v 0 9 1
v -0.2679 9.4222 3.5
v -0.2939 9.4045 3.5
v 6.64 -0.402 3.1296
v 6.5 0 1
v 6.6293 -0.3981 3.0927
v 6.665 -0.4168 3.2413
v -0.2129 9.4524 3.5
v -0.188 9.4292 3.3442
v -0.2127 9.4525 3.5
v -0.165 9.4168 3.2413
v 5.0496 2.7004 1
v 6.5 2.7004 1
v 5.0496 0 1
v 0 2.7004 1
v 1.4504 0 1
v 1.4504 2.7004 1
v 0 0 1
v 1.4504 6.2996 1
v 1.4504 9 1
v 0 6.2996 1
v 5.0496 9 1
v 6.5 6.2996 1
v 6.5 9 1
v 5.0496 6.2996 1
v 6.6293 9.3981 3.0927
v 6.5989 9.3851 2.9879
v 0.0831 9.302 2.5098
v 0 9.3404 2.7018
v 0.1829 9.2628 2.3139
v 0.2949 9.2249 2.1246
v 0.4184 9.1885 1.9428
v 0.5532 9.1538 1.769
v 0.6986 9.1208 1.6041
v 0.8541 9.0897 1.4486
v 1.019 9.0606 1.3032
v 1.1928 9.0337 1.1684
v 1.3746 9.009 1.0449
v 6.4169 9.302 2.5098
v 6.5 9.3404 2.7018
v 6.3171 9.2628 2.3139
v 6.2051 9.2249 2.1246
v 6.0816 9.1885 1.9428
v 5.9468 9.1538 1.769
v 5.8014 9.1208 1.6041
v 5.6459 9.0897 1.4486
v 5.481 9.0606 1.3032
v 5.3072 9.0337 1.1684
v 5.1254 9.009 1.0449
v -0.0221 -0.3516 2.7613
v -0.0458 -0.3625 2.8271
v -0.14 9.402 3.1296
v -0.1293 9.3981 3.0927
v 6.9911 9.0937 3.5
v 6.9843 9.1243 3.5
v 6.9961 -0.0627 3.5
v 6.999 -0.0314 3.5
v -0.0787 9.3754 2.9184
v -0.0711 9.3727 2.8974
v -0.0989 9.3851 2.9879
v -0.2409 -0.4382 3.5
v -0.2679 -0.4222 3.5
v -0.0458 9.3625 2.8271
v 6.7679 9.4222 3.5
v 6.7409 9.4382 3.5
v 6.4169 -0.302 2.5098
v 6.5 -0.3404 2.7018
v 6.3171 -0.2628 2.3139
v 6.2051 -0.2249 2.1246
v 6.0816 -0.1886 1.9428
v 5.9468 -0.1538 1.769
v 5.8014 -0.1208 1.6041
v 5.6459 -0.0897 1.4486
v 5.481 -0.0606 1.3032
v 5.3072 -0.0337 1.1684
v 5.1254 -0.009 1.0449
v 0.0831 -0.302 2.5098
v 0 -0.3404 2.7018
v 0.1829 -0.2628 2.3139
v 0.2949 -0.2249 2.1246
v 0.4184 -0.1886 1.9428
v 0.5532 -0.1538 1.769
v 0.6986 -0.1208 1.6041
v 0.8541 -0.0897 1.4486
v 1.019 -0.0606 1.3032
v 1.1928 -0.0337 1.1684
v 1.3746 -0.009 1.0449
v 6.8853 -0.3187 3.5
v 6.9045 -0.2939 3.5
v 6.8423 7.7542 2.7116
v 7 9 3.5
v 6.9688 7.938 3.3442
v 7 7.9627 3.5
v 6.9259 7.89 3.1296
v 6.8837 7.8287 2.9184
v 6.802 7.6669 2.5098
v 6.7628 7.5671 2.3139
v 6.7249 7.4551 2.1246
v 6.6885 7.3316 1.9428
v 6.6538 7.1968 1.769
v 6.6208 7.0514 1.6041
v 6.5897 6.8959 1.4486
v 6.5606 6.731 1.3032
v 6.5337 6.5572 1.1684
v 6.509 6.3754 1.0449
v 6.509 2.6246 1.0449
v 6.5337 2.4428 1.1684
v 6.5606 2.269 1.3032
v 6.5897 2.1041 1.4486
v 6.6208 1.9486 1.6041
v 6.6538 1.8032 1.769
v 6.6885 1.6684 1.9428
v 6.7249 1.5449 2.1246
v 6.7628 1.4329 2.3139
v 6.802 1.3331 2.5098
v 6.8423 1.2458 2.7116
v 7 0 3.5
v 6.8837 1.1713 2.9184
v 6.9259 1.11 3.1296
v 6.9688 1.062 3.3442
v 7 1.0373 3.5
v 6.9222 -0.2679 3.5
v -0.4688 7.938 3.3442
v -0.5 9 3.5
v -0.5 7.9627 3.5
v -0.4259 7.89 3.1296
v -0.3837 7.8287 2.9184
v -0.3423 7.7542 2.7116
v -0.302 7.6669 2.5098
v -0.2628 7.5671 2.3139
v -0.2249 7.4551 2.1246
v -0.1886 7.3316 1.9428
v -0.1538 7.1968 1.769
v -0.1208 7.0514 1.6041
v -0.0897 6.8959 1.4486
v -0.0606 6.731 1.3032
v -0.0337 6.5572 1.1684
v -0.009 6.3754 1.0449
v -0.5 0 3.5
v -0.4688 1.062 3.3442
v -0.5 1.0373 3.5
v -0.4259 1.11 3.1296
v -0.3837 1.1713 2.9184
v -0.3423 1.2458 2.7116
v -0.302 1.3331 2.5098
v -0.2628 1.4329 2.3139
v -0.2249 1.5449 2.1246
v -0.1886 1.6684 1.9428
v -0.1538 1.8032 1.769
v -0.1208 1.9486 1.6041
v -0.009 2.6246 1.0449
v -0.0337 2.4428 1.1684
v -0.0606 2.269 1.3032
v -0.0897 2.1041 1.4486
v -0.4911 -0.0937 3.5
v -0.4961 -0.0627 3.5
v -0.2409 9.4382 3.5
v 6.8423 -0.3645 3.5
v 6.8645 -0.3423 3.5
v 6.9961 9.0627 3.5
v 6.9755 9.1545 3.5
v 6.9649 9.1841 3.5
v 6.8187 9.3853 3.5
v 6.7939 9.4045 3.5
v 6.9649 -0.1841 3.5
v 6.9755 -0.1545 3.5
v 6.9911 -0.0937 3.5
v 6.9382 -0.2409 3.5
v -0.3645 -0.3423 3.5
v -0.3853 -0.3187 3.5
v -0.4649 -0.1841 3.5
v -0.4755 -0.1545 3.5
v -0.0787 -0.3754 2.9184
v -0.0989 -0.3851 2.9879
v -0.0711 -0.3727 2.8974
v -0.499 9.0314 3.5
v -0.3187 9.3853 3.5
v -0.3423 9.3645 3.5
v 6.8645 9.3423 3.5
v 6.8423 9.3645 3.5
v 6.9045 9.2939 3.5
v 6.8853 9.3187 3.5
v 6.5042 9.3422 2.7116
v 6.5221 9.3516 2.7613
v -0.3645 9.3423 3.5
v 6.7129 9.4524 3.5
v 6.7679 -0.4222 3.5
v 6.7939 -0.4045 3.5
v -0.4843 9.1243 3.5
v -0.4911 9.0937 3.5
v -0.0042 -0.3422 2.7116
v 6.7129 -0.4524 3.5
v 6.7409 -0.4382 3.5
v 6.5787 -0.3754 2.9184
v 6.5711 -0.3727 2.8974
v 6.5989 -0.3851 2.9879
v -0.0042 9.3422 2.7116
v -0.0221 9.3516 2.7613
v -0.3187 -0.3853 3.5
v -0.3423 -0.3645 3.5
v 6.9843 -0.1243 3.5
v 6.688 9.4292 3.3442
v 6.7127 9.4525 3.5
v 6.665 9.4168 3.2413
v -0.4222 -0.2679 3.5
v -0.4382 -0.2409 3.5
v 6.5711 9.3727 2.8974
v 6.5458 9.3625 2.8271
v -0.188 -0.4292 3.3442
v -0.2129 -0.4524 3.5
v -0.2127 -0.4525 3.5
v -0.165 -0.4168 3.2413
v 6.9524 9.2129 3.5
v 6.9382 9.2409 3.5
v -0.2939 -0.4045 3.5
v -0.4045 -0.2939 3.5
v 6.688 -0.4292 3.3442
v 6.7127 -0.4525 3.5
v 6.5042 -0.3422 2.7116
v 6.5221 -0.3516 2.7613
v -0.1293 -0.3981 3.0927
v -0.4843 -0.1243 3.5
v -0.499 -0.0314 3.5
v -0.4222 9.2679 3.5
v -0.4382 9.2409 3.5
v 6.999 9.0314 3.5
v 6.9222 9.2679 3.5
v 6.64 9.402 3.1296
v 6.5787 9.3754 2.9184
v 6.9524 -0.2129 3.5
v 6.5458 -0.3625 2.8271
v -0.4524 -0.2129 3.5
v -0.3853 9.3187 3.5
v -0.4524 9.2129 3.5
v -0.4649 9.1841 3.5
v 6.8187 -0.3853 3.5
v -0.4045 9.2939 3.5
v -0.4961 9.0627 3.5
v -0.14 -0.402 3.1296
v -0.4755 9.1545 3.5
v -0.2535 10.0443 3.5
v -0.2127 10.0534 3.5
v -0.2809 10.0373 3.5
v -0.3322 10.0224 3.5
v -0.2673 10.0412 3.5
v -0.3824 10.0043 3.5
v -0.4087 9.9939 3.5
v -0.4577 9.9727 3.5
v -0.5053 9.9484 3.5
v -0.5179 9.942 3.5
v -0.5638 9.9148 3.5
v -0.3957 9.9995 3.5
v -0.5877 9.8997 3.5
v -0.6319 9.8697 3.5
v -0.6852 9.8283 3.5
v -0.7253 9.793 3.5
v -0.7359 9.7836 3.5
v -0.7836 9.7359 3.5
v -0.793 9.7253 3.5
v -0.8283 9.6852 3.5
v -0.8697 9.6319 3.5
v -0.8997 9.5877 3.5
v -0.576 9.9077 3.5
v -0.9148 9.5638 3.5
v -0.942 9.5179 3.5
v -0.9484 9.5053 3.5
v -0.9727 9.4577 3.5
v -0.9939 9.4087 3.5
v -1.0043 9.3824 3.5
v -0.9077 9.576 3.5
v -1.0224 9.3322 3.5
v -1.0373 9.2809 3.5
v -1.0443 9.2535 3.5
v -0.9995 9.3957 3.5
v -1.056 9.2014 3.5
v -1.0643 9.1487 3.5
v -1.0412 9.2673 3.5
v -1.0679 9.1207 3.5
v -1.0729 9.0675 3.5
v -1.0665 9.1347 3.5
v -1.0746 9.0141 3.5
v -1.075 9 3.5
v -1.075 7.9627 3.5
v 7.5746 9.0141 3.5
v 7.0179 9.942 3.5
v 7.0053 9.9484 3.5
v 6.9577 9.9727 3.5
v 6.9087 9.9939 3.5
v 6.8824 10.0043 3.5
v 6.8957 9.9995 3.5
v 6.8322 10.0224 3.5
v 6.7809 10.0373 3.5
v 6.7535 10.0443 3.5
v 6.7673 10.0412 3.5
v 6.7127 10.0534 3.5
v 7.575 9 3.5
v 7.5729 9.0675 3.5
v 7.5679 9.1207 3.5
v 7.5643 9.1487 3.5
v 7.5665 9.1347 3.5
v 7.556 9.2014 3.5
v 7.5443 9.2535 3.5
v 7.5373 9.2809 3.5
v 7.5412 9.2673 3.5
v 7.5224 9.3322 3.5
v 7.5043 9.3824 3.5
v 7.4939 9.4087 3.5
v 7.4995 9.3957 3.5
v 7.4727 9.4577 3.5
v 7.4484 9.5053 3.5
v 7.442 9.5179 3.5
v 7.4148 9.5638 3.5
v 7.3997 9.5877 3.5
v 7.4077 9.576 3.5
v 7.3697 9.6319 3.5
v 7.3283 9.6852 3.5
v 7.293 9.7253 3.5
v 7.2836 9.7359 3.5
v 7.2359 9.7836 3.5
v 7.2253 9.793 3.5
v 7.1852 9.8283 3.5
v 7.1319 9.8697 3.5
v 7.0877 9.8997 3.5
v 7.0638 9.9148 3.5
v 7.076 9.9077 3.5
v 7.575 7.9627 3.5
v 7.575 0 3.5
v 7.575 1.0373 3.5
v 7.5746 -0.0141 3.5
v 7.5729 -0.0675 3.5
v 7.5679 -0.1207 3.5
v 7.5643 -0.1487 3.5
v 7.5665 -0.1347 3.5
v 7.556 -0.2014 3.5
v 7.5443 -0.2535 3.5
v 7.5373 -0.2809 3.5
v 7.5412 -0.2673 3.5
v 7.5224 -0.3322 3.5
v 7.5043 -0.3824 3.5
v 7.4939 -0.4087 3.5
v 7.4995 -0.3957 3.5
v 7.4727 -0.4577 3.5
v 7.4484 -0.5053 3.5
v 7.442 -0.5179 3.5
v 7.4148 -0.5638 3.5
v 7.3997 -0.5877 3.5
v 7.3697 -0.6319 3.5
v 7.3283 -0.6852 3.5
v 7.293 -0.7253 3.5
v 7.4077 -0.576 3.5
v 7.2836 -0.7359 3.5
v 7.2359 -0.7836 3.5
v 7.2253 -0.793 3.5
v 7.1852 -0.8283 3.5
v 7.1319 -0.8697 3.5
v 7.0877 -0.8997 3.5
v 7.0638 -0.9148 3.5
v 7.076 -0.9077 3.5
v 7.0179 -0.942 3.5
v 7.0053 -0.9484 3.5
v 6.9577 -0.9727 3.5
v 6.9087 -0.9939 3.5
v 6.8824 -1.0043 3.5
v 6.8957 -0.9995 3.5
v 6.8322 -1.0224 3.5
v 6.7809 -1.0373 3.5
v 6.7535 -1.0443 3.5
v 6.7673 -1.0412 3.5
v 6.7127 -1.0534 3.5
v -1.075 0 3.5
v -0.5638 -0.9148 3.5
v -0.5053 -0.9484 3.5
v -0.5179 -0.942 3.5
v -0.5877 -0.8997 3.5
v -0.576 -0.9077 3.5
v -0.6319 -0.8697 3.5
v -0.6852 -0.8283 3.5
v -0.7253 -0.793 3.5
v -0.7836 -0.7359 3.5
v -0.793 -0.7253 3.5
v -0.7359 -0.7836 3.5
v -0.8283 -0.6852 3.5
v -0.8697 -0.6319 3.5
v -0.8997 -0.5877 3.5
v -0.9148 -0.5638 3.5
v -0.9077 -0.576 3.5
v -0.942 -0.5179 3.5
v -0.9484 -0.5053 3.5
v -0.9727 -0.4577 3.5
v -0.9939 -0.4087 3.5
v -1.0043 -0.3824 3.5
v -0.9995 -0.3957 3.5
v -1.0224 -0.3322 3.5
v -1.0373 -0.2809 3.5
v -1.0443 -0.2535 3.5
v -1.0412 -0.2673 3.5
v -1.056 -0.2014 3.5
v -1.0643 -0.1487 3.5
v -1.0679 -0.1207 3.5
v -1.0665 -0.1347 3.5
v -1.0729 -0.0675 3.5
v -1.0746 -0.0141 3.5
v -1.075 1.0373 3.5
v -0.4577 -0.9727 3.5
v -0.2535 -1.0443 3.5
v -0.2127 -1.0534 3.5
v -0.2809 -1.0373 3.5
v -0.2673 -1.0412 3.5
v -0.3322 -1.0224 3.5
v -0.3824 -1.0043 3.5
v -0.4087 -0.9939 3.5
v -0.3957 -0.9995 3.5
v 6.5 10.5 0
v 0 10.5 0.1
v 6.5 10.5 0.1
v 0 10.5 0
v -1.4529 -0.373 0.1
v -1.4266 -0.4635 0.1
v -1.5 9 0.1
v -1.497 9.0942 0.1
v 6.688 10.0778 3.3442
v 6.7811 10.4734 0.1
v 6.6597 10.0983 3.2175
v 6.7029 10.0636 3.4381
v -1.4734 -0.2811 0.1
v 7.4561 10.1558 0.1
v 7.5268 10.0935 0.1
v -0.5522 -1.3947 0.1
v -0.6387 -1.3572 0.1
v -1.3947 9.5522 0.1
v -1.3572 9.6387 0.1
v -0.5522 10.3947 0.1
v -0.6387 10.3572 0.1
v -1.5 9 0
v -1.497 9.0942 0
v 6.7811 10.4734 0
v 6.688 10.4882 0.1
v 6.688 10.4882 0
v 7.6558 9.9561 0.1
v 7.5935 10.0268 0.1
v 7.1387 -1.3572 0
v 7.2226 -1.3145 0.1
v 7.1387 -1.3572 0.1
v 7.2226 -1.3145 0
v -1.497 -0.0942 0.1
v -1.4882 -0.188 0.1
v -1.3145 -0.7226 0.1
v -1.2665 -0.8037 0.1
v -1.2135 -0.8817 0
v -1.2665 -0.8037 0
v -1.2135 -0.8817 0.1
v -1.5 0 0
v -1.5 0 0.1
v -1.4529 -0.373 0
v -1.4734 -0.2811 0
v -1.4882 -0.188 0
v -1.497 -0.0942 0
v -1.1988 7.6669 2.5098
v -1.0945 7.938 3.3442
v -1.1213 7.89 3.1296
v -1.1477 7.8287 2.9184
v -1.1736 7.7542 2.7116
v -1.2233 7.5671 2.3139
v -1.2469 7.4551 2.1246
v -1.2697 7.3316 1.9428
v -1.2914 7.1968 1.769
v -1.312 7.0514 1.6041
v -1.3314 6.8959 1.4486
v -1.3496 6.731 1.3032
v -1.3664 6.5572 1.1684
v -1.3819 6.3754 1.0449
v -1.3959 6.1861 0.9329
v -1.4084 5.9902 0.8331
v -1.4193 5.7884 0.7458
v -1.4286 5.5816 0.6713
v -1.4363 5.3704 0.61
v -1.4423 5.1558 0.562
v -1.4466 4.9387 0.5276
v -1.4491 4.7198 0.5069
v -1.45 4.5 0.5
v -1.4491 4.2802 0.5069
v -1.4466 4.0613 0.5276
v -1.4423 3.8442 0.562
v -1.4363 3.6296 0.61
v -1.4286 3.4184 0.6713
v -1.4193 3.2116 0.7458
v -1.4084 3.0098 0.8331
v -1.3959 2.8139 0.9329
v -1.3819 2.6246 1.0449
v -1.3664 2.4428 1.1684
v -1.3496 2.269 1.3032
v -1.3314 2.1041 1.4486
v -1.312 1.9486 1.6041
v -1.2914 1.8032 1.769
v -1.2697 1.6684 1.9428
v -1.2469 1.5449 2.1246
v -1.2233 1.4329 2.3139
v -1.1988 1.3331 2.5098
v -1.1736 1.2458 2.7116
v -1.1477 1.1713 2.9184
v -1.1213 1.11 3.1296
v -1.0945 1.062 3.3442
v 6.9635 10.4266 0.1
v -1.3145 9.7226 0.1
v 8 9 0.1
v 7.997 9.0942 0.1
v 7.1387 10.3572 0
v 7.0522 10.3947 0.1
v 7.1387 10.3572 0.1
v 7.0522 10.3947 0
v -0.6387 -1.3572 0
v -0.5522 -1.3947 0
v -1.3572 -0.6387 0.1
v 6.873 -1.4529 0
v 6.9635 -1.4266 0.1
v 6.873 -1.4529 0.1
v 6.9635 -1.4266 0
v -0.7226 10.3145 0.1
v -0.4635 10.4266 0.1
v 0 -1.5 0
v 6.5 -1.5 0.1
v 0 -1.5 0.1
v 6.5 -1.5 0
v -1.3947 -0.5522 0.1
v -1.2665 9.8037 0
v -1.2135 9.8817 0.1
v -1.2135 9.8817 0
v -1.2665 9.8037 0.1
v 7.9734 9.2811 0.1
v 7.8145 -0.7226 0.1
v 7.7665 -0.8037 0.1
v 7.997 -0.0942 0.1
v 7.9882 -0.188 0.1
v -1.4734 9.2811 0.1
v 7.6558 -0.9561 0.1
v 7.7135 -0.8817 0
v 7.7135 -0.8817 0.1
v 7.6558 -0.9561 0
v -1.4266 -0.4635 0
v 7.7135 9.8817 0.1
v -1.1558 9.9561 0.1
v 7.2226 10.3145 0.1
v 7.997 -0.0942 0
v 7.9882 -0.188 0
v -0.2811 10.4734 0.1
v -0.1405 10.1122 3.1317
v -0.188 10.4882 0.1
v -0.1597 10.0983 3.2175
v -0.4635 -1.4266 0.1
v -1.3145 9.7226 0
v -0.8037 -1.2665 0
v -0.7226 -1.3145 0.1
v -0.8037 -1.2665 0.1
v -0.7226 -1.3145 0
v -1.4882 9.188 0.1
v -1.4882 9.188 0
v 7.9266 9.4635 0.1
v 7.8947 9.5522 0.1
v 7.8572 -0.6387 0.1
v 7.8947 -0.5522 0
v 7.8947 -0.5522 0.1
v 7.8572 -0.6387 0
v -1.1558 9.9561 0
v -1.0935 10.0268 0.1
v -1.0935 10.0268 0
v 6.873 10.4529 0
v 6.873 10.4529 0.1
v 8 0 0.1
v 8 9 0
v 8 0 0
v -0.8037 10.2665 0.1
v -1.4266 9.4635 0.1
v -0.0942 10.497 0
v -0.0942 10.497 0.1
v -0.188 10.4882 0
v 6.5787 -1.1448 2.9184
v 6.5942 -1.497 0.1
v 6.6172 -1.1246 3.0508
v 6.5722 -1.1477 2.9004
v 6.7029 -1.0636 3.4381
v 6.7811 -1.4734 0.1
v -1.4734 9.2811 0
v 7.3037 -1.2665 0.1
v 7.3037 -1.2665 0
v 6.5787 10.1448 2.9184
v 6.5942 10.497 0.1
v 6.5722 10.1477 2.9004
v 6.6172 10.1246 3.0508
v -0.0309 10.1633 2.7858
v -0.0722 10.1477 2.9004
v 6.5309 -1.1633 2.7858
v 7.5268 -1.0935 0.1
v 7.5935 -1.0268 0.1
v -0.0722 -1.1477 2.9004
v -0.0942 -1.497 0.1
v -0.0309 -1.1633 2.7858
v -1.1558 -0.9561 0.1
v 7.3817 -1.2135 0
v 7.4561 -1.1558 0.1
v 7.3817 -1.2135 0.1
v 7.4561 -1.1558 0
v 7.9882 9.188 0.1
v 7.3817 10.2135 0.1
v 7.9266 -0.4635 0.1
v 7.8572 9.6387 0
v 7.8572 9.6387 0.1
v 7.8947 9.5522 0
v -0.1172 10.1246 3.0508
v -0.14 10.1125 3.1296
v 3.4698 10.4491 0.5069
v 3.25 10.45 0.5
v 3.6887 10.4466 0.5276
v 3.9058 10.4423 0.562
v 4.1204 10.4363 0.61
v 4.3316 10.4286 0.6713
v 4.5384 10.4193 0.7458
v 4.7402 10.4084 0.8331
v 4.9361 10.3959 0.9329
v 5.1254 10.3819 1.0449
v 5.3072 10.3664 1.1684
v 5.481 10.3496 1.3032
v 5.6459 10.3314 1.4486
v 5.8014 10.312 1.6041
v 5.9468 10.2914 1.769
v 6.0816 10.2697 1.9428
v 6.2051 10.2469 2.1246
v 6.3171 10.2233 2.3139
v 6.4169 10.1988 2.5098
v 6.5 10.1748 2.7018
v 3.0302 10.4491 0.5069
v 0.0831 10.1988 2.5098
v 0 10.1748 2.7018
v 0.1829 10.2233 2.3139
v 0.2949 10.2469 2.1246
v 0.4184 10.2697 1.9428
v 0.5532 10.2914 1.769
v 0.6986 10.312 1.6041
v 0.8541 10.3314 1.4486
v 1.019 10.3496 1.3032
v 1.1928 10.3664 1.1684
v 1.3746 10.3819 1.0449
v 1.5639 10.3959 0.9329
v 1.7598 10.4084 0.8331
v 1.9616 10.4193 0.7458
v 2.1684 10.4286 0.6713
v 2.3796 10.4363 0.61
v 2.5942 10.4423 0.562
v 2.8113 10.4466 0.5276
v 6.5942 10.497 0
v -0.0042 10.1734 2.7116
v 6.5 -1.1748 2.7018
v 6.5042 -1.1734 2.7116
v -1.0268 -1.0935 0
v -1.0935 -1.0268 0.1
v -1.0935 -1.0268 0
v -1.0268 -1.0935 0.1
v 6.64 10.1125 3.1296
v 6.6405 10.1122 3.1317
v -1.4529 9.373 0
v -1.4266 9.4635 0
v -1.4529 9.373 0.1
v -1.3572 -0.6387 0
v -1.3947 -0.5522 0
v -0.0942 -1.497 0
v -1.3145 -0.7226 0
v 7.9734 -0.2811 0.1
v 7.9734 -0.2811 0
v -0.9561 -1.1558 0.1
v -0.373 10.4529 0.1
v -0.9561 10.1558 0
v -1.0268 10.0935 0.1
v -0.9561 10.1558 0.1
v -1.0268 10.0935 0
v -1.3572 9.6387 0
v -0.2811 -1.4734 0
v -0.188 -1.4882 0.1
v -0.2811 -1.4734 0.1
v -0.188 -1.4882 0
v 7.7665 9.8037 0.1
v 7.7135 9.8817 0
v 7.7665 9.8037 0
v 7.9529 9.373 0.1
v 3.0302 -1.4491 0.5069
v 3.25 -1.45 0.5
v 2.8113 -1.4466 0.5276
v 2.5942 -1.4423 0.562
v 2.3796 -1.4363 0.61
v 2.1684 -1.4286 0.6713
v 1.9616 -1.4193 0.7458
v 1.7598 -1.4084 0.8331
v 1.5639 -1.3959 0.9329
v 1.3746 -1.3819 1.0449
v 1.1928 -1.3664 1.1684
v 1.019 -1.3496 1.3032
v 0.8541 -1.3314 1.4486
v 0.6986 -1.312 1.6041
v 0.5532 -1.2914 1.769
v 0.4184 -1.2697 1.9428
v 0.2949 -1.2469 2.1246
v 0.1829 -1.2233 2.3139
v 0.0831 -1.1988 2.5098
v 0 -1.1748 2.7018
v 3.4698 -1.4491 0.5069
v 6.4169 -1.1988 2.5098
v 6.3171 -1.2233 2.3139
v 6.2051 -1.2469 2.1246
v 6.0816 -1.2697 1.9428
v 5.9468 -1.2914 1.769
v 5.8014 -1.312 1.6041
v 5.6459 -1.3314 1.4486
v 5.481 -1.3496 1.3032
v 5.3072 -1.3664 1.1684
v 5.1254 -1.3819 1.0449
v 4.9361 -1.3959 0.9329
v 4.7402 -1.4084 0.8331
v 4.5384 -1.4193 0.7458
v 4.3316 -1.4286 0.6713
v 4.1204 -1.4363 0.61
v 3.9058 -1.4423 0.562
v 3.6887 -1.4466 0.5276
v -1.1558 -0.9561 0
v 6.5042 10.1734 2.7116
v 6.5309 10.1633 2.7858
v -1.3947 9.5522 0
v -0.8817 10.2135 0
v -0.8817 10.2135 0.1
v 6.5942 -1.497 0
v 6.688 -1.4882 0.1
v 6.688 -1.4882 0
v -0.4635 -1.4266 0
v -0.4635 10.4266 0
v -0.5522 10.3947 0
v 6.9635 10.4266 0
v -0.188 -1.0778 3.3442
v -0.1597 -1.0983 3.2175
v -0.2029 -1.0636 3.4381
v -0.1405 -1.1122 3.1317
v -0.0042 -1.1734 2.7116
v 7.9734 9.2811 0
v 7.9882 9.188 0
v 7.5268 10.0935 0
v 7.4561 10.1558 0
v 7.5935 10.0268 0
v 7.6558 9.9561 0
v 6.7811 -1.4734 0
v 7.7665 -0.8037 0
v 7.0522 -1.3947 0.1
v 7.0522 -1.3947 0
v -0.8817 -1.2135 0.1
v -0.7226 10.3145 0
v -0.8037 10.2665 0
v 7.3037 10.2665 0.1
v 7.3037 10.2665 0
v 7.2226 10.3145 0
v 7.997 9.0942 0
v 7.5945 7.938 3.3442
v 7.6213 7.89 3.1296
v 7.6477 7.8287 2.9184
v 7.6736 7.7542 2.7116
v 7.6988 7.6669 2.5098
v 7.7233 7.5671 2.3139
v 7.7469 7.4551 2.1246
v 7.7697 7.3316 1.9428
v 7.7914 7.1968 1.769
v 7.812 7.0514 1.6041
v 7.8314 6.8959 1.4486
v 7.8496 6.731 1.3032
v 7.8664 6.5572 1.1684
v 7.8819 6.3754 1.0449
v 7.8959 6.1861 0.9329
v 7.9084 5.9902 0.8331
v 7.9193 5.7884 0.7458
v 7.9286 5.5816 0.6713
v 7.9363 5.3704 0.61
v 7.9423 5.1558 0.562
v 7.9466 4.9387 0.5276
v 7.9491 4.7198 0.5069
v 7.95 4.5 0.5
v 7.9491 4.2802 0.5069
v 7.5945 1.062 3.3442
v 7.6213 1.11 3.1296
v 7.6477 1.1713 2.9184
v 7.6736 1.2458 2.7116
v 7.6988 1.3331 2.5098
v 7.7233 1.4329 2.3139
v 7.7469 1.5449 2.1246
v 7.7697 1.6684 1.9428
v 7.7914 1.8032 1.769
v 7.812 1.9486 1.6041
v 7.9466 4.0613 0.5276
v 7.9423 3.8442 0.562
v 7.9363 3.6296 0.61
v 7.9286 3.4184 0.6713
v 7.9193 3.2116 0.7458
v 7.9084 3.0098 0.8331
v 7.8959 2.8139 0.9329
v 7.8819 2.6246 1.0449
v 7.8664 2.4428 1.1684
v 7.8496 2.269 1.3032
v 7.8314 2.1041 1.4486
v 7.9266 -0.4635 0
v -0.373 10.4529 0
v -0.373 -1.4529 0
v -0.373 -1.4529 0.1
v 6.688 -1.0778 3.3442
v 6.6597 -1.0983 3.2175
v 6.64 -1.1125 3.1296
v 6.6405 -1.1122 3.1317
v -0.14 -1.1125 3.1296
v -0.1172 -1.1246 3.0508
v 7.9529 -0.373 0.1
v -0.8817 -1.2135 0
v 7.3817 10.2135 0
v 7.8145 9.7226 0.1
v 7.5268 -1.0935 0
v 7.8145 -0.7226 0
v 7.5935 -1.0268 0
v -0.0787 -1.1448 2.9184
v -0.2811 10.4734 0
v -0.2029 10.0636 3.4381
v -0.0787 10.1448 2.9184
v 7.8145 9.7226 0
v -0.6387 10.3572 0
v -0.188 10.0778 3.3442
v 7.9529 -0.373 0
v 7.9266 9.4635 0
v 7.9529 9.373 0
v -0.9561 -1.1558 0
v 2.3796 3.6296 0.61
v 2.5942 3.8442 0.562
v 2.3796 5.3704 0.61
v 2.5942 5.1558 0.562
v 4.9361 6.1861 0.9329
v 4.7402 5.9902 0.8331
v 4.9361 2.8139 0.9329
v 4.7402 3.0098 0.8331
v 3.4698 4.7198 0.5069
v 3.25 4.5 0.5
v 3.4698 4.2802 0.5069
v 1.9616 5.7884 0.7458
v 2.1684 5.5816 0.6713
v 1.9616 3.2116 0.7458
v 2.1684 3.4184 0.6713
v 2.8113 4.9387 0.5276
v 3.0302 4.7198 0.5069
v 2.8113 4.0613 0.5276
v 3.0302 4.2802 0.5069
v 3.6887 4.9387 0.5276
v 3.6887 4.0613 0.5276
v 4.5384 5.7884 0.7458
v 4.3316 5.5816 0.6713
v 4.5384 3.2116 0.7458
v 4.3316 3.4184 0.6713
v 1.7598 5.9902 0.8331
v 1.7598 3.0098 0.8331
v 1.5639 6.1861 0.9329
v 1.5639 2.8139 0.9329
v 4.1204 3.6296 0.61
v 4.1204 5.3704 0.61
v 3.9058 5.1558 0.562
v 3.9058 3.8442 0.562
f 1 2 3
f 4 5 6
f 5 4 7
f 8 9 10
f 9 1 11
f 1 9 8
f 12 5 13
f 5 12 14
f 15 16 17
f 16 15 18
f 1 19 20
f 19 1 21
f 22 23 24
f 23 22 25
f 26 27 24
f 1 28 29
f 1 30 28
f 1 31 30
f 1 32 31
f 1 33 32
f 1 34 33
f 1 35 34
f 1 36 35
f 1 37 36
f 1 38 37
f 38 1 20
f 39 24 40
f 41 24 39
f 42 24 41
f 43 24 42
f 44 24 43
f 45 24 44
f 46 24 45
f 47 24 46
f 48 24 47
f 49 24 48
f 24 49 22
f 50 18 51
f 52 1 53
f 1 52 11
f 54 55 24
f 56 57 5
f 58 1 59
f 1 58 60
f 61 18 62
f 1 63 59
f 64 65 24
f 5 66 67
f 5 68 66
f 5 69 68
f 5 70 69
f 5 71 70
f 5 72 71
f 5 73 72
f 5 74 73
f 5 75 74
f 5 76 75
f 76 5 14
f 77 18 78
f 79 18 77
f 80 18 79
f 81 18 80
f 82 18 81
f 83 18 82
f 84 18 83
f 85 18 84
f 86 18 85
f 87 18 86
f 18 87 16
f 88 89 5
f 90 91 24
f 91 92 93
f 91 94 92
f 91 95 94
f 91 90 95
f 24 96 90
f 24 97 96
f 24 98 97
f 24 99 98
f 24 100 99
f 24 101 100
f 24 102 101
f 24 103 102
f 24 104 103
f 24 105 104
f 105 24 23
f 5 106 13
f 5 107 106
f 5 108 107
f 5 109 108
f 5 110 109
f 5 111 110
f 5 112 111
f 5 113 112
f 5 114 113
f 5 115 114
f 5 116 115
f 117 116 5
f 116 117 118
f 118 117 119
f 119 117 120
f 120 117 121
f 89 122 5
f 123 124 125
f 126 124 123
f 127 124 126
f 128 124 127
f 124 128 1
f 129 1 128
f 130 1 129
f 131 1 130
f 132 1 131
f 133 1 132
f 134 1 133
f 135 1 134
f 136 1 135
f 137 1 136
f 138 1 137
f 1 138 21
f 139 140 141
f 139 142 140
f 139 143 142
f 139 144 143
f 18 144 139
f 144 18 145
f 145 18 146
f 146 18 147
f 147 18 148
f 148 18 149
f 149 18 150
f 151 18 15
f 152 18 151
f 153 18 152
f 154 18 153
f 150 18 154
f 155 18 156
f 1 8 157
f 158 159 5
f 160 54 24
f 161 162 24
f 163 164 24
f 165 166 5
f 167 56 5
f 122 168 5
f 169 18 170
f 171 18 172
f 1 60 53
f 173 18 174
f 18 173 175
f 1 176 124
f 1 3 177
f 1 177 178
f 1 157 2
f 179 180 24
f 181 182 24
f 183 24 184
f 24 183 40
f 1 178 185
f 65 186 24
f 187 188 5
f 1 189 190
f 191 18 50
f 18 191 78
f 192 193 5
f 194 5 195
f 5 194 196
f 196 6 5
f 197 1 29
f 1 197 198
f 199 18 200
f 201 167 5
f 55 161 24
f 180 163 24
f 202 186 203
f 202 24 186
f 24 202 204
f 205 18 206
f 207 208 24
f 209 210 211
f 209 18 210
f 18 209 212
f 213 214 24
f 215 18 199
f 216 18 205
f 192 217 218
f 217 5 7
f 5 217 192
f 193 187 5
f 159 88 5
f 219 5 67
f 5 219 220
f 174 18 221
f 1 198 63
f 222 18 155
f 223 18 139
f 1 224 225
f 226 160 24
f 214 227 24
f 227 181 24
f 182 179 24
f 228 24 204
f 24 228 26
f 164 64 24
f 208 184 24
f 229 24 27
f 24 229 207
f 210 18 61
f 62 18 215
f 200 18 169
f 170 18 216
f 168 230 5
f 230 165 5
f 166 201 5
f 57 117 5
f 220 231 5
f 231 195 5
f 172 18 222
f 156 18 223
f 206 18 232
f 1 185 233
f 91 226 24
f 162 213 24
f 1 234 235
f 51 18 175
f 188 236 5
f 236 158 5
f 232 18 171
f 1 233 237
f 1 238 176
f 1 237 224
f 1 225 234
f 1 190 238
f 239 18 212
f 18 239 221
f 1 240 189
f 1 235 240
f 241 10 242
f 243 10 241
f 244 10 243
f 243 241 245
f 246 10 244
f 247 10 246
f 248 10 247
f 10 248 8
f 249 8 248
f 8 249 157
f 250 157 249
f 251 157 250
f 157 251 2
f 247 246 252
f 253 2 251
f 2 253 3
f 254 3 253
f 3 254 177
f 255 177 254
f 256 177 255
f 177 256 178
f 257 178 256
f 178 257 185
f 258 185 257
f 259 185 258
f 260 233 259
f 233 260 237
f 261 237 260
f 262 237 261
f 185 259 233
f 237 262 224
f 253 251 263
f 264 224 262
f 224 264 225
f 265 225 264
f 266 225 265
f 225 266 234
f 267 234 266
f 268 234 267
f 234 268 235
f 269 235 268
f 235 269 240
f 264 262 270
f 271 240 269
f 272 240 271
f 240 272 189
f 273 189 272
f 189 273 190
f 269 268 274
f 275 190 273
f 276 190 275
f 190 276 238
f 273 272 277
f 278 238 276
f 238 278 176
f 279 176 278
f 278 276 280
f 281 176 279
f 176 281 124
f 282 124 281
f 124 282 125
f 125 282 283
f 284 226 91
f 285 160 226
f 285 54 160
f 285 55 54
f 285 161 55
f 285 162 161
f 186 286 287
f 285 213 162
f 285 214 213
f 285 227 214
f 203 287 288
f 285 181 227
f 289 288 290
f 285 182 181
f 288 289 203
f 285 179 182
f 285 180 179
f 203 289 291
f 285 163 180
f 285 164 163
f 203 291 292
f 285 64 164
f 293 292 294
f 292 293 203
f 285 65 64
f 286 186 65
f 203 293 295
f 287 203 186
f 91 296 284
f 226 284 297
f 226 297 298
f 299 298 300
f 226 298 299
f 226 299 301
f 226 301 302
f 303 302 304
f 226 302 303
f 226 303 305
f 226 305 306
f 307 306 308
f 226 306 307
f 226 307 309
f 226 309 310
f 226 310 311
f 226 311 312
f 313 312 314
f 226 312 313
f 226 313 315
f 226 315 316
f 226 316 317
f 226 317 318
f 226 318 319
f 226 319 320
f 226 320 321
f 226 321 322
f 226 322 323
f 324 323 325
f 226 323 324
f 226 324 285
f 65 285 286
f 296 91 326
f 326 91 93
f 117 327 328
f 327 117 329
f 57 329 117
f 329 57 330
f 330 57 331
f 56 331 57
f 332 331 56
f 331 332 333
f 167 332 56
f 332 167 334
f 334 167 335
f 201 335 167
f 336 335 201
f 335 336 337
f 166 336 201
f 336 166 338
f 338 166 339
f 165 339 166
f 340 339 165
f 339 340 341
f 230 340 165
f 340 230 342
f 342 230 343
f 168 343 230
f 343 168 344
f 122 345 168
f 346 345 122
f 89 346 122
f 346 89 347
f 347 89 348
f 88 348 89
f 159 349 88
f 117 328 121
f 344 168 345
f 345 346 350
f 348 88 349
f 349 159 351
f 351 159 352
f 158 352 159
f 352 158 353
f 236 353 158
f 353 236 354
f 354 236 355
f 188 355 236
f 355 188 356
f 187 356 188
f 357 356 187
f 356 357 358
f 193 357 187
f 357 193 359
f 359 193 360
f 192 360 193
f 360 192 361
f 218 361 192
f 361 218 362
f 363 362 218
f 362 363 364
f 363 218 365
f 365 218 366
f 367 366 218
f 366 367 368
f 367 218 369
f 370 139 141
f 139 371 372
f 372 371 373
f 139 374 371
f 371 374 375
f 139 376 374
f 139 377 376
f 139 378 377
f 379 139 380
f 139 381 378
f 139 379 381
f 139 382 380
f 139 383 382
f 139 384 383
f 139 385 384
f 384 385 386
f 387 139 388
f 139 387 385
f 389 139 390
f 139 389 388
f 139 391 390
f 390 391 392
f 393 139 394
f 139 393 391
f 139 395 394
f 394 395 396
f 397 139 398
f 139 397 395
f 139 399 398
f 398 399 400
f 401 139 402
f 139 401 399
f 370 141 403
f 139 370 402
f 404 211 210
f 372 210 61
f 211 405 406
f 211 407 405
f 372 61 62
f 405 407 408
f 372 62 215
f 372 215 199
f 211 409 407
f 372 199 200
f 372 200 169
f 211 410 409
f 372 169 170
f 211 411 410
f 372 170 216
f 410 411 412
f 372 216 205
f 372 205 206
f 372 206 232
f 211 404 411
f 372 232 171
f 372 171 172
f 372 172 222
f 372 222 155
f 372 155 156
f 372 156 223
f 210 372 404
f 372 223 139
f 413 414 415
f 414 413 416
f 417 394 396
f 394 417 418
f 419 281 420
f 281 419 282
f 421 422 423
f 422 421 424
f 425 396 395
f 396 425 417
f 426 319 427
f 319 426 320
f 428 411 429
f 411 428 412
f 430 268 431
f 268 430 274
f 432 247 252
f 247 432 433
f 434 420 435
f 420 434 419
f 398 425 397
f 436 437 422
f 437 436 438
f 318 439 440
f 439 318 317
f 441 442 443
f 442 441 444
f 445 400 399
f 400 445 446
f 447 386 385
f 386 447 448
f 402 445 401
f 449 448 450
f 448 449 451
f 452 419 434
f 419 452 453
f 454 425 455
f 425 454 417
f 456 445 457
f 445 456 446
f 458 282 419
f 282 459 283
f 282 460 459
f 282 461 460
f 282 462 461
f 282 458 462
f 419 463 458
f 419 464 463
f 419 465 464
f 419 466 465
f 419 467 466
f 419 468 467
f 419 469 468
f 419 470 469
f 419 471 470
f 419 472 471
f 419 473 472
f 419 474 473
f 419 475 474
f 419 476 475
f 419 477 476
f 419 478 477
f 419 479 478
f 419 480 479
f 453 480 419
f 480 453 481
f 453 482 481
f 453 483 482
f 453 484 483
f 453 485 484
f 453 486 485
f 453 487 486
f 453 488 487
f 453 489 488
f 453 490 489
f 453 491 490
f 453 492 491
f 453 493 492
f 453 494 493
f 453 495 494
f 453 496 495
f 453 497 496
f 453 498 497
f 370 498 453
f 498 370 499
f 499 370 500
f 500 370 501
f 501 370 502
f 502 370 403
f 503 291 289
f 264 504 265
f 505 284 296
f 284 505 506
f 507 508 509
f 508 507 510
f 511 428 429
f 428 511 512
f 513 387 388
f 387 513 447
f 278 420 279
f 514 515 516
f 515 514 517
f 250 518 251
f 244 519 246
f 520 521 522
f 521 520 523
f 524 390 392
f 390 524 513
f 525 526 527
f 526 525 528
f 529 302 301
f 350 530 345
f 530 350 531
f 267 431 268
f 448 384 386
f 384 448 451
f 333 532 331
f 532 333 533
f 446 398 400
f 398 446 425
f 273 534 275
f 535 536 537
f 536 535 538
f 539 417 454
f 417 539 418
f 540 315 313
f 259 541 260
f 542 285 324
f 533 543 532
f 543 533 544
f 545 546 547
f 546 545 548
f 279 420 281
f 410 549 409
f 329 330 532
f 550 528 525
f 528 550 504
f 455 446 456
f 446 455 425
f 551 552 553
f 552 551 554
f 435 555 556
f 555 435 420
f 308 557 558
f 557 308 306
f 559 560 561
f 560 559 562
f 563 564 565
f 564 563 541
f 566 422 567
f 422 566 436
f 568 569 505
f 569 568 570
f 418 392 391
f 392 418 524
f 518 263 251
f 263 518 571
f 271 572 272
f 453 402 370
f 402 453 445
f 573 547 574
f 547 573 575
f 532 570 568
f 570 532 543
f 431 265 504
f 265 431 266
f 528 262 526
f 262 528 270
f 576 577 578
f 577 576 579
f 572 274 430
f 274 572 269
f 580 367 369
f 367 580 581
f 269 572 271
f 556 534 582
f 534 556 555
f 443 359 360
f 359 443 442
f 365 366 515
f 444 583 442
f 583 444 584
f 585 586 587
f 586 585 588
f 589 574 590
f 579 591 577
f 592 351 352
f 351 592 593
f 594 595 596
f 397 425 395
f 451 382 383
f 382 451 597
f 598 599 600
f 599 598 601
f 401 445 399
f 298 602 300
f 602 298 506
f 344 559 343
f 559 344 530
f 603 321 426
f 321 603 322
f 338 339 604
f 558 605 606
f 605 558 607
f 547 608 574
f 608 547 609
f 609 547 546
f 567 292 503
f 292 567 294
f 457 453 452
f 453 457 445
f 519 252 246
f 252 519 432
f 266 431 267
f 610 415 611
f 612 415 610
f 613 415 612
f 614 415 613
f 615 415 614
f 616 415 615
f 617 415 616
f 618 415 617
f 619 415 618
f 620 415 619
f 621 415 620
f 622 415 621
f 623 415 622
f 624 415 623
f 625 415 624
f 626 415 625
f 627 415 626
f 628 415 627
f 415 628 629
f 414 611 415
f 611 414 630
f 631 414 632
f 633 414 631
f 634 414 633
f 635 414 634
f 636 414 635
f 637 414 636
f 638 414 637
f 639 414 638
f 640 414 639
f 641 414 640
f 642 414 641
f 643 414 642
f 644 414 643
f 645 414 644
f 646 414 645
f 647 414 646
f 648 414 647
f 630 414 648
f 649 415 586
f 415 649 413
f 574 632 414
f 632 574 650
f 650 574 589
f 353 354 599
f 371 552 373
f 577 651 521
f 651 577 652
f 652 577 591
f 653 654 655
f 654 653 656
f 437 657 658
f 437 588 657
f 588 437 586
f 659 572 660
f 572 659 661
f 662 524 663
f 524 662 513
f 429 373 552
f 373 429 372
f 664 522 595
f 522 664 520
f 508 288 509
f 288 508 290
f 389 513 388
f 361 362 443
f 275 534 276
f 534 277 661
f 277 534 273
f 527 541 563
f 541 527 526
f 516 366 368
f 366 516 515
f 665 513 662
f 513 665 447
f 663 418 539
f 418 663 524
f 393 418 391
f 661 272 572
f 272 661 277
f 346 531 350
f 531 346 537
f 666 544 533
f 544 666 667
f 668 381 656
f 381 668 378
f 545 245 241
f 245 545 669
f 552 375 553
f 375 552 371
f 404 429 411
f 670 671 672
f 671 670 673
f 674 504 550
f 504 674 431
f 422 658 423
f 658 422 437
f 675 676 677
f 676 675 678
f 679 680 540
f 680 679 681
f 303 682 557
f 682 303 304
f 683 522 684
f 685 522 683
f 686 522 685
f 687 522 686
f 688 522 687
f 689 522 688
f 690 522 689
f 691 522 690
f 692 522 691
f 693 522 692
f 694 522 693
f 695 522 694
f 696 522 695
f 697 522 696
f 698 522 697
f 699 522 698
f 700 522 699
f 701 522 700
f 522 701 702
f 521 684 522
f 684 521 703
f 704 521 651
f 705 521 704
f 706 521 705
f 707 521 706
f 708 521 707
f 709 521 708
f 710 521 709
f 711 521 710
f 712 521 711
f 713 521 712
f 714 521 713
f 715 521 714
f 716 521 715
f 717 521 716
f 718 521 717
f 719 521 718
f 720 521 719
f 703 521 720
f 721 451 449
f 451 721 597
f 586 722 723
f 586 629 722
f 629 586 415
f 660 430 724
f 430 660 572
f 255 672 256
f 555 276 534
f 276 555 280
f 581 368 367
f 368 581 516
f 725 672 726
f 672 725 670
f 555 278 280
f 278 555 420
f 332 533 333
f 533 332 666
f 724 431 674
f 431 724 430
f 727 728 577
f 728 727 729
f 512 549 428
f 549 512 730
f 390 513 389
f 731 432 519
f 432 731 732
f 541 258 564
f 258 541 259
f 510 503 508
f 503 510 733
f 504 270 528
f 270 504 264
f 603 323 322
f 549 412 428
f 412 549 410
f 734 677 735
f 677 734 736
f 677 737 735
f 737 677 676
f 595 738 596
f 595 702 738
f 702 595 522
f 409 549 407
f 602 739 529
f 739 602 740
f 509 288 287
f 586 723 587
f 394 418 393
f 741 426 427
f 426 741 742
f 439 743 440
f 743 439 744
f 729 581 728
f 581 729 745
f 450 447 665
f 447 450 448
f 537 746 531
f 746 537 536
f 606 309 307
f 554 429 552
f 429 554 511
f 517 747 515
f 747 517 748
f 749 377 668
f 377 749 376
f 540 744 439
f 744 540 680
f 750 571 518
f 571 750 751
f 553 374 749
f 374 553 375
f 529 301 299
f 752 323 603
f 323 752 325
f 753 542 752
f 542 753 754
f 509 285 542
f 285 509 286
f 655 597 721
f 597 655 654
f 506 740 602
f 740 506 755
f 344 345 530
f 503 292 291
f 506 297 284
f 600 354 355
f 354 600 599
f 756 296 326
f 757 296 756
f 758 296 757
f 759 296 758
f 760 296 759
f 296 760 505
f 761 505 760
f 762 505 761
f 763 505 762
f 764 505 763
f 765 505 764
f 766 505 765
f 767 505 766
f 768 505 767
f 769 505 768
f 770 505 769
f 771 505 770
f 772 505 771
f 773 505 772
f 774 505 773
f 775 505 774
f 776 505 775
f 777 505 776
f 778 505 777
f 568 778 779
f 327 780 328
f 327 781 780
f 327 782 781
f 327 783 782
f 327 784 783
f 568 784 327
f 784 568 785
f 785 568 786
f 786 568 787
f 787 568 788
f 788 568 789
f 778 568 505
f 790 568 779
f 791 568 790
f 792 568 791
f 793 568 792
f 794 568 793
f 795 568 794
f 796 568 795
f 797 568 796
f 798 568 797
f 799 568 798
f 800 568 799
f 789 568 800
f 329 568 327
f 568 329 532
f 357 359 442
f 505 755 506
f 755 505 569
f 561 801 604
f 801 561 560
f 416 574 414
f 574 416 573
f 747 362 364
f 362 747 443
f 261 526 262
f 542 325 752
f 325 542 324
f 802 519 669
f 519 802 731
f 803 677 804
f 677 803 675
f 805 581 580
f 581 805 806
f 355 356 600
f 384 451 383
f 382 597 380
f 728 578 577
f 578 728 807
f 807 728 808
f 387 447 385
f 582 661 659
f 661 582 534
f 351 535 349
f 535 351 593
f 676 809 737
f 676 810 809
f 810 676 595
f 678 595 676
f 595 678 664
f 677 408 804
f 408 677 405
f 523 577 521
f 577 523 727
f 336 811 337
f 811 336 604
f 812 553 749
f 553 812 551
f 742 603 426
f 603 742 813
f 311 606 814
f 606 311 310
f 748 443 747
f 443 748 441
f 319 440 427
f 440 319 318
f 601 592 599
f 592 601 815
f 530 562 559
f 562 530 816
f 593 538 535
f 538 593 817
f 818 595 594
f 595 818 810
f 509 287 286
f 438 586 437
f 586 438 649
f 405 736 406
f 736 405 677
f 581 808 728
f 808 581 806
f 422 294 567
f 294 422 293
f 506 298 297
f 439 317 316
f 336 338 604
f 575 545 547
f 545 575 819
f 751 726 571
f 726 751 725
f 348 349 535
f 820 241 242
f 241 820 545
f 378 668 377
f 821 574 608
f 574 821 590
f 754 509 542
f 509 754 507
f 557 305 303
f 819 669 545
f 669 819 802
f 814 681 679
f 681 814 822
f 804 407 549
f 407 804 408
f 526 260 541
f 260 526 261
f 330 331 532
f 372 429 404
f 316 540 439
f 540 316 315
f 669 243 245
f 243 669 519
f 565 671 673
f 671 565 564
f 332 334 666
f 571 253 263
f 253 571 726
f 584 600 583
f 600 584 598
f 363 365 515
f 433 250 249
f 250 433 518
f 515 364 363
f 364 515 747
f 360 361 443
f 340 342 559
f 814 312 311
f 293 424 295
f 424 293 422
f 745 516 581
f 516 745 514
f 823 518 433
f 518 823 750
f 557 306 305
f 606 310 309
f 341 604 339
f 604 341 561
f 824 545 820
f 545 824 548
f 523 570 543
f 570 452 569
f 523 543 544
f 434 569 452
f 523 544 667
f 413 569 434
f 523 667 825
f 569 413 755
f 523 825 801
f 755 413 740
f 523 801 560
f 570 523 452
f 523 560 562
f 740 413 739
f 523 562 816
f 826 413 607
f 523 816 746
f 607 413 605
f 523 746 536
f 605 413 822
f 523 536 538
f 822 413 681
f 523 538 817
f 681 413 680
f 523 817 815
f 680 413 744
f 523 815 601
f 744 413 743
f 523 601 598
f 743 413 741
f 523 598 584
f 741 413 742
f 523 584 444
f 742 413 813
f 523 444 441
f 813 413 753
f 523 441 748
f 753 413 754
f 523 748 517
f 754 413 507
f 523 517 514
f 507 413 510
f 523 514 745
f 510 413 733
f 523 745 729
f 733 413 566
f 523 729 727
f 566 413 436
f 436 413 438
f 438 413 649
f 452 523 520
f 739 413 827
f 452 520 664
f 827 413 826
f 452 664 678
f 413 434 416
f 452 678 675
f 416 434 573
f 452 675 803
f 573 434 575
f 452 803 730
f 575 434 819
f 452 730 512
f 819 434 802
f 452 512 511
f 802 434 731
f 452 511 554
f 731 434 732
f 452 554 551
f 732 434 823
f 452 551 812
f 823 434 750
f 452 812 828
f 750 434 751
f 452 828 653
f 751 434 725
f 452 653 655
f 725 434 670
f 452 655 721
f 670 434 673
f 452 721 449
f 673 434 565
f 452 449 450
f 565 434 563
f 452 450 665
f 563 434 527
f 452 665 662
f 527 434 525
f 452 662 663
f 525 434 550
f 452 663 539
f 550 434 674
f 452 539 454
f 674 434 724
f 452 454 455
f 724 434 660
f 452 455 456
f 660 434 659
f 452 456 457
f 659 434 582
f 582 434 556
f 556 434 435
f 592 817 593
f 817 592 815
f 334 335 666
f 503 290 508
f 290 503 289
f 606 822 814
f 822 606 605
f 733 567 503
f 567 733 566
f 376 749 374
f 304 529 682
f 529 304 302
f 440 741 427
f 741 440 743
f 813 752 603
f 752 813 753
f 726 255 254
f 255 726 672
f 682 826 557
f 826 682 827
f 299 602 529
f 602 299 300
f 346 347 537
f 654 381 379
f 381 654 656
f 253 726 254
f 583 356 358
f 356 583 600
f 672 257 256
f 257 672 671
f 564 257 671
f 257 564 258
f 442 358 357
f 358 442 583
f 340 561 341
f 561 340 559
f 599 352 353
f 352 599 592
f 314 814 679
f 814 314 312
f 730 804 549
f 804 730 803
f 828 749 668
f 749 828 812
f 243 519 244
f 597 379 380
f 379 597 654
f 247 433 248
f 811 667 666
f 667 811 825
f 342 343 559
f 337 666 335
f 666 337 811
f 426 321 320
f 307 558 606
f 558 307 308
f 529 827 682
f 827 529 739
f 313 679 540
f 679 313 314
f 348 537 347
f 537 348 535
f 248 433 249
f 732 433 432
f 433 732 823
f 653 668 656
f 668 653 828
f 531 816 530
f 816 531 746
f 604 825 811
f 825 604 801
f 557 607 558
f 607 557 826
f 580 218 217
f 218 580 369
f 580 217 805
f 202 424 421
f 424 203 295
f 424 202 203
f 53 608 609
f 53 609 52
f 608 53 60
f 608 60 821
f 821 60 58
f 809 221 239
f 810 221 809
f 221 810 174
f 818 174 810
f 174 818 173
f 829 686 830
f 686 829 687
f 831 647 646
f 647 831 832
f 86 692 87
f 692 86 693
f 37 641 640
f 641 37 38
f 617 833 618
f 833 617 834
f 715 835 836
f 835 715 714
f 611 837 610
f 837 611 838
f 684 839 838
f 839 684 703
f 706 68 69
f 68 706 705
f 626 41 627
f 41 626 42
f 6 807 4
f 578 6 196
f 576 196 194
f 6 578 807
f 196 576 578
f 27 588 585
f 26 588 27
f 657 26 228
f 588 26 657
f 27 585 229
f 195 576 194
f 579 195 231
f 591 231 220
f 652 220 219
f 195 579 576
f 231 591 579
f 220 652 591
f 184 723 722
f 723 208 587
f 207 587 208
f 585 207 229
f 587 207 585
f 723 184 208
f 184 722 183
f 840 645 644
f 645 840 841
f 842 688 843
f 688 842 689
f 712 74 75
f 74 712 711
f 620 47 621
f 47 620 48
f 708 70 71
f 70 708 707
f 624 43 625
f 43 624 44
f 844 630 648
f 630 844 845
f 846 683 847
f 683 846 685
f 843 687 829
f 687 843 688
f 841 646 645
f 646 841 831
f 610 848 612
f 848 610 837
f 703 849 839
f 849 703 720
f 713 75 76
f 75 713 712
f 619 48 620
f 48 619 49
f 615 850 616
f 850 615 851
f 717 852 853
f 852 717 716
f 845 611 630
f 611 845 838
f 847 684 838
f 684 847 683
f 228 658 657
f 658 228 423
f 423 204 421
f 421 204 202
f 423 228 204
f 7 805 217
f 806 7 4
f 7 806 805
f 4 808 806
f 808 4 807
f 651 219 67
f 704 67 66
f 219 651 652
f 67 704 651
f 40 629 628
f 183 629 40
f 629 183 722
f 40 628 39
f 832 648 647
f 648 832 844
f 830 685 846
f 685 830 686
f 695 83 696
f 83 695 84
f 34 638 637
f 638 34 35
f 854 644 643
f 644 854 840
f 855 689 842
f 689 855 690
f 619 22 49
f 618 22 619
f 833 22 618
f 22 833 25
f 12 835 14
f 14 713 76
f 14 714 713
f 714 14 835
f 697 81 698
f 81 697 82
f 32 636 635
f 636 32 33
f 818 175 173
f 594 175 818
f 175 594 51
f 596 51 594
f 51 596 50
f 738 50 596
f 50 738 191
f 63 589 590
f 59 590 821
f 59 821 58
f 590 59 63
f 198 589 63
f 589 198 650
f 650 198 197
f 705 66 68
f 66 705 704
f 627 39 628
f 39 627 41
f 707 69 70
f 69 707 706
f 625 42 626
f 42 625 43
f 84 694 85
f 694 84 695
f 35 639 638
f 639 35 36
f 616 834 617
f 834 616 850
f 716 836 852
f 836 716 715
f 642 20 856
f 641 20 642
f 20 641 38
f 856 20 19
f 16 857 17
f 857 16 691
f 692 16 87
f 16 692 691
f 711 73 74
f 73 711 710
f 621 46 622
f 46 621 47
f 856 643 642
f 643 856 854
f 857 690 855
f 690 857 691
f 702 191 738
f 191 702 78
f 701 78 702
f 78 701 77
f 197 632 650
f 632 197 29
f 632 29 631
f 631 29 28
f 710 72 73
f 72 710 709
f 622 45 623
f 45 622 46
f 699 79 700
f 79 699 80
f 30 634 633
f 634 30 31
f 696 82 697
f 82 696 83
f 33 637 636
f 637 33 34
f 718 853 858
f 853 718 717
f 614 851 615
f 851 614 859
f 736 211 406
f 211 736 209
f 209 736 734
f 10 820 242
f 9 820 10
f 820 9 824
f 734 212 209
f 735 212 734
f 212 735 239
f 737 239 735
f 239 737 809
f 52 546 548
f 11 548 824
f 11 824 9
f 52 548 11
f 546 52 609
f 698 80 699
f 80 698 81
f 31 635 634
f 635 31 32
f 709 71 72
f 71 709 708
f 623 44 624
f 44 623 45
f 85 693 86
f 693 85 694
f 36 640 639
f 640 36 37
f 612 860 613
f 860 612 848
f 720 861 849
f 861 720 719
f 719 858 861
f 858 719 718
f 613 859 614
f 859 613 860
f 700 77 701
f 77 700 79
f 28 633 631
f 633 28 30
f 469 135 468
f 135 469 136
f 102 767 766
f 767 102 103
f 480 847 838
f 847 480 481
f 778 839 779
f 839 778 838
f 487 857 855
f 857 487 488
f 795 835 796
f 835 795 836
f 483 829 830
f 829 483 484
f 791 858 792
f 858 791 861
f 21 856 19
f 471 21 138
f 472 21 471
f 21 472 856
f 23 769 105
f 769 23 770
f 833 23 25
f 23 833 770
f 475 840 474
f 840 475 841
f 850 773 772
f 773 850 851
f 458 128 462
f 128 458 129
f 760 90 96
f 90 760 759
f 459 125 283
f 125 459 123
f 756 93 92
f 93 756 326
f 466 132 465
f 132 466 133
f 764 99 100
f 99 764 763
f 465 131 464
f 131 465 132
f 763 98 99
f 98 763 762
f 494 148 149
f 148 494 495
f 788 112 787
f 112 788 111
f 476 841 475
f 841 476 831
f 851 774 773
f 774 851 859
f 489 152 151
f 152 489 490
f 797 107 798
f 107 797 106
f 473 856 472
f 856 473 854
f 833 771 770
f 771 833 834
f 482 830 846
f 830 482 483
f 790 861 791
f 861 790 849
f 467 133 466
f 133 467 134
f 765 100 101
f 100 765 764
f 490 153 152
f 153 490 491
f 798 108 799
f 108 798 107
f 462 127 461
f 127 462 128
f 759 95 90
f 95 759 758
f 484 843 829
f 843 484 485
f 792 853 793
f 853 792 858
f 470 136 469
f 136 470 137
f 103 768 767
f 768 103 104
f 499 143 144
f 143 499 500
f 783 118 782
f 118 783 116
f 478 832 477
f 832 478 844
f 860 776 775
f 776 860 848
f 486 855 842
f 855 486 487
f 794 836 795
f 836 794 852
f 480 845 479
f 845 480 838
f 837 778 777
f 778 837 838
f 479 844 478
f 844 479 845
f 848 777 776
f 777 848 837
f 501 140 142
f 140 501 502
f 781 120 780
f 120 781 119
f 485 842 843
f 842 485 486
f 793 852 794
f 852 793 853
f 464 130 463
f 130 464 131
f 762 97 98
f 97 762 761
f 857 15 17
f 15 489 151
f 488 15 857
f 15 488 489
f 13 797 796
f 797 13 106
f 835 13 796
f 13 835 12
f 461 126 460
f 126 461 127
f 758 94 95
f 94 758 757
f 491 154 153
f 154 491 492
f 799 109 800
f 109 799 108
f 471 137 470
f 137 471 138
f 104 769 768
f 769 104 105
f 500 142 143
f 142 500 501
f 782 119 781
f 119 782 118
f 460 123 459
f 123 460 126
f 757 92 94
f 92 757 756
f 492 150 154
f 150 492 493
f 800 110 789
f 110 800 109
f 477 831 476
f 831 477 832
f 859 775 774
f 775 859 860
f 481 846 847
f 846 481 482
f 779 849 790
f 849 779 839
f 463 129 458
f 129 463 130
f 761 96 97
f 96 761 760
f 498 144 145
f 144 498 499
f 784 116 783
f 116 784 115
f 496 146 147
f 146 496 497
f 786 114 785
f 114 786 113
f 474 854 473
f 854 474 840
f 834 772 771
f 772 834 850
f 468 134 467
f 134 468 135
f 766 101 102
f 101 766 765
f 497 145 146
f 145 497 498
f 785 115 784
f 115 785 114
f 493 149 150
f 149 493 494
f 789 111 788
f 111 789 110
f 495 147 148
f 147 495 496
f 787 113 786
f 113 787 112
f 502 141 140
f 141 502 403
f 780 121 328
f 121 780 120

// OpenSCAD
$fn=100;
difference(){
    difference(){
        minkowski(){
            cube([6.5,9,.1]);
            cylinder(4,d1=3,d2=2);
        }        
        translate([0,0,1]){
            union(){
                minkowski(){
                    cube([6.5,9,.1]);
                    cylinder(2.5,d1=0,d2=1);
                }
                translate([-1.25,-1.5,2.5]){
                    cube([9,12,1]);
                }
            }
        }
    }
    union(){
        translate([3.25,-4,4]){
            rotate([270,0,0]){
                cylinder(32,d=7);
            }
        }
        translate([10,4.5,4]){
            rotate([270,0,90]){
                cylinder(32,d=7);
            }
        }
    }
}
